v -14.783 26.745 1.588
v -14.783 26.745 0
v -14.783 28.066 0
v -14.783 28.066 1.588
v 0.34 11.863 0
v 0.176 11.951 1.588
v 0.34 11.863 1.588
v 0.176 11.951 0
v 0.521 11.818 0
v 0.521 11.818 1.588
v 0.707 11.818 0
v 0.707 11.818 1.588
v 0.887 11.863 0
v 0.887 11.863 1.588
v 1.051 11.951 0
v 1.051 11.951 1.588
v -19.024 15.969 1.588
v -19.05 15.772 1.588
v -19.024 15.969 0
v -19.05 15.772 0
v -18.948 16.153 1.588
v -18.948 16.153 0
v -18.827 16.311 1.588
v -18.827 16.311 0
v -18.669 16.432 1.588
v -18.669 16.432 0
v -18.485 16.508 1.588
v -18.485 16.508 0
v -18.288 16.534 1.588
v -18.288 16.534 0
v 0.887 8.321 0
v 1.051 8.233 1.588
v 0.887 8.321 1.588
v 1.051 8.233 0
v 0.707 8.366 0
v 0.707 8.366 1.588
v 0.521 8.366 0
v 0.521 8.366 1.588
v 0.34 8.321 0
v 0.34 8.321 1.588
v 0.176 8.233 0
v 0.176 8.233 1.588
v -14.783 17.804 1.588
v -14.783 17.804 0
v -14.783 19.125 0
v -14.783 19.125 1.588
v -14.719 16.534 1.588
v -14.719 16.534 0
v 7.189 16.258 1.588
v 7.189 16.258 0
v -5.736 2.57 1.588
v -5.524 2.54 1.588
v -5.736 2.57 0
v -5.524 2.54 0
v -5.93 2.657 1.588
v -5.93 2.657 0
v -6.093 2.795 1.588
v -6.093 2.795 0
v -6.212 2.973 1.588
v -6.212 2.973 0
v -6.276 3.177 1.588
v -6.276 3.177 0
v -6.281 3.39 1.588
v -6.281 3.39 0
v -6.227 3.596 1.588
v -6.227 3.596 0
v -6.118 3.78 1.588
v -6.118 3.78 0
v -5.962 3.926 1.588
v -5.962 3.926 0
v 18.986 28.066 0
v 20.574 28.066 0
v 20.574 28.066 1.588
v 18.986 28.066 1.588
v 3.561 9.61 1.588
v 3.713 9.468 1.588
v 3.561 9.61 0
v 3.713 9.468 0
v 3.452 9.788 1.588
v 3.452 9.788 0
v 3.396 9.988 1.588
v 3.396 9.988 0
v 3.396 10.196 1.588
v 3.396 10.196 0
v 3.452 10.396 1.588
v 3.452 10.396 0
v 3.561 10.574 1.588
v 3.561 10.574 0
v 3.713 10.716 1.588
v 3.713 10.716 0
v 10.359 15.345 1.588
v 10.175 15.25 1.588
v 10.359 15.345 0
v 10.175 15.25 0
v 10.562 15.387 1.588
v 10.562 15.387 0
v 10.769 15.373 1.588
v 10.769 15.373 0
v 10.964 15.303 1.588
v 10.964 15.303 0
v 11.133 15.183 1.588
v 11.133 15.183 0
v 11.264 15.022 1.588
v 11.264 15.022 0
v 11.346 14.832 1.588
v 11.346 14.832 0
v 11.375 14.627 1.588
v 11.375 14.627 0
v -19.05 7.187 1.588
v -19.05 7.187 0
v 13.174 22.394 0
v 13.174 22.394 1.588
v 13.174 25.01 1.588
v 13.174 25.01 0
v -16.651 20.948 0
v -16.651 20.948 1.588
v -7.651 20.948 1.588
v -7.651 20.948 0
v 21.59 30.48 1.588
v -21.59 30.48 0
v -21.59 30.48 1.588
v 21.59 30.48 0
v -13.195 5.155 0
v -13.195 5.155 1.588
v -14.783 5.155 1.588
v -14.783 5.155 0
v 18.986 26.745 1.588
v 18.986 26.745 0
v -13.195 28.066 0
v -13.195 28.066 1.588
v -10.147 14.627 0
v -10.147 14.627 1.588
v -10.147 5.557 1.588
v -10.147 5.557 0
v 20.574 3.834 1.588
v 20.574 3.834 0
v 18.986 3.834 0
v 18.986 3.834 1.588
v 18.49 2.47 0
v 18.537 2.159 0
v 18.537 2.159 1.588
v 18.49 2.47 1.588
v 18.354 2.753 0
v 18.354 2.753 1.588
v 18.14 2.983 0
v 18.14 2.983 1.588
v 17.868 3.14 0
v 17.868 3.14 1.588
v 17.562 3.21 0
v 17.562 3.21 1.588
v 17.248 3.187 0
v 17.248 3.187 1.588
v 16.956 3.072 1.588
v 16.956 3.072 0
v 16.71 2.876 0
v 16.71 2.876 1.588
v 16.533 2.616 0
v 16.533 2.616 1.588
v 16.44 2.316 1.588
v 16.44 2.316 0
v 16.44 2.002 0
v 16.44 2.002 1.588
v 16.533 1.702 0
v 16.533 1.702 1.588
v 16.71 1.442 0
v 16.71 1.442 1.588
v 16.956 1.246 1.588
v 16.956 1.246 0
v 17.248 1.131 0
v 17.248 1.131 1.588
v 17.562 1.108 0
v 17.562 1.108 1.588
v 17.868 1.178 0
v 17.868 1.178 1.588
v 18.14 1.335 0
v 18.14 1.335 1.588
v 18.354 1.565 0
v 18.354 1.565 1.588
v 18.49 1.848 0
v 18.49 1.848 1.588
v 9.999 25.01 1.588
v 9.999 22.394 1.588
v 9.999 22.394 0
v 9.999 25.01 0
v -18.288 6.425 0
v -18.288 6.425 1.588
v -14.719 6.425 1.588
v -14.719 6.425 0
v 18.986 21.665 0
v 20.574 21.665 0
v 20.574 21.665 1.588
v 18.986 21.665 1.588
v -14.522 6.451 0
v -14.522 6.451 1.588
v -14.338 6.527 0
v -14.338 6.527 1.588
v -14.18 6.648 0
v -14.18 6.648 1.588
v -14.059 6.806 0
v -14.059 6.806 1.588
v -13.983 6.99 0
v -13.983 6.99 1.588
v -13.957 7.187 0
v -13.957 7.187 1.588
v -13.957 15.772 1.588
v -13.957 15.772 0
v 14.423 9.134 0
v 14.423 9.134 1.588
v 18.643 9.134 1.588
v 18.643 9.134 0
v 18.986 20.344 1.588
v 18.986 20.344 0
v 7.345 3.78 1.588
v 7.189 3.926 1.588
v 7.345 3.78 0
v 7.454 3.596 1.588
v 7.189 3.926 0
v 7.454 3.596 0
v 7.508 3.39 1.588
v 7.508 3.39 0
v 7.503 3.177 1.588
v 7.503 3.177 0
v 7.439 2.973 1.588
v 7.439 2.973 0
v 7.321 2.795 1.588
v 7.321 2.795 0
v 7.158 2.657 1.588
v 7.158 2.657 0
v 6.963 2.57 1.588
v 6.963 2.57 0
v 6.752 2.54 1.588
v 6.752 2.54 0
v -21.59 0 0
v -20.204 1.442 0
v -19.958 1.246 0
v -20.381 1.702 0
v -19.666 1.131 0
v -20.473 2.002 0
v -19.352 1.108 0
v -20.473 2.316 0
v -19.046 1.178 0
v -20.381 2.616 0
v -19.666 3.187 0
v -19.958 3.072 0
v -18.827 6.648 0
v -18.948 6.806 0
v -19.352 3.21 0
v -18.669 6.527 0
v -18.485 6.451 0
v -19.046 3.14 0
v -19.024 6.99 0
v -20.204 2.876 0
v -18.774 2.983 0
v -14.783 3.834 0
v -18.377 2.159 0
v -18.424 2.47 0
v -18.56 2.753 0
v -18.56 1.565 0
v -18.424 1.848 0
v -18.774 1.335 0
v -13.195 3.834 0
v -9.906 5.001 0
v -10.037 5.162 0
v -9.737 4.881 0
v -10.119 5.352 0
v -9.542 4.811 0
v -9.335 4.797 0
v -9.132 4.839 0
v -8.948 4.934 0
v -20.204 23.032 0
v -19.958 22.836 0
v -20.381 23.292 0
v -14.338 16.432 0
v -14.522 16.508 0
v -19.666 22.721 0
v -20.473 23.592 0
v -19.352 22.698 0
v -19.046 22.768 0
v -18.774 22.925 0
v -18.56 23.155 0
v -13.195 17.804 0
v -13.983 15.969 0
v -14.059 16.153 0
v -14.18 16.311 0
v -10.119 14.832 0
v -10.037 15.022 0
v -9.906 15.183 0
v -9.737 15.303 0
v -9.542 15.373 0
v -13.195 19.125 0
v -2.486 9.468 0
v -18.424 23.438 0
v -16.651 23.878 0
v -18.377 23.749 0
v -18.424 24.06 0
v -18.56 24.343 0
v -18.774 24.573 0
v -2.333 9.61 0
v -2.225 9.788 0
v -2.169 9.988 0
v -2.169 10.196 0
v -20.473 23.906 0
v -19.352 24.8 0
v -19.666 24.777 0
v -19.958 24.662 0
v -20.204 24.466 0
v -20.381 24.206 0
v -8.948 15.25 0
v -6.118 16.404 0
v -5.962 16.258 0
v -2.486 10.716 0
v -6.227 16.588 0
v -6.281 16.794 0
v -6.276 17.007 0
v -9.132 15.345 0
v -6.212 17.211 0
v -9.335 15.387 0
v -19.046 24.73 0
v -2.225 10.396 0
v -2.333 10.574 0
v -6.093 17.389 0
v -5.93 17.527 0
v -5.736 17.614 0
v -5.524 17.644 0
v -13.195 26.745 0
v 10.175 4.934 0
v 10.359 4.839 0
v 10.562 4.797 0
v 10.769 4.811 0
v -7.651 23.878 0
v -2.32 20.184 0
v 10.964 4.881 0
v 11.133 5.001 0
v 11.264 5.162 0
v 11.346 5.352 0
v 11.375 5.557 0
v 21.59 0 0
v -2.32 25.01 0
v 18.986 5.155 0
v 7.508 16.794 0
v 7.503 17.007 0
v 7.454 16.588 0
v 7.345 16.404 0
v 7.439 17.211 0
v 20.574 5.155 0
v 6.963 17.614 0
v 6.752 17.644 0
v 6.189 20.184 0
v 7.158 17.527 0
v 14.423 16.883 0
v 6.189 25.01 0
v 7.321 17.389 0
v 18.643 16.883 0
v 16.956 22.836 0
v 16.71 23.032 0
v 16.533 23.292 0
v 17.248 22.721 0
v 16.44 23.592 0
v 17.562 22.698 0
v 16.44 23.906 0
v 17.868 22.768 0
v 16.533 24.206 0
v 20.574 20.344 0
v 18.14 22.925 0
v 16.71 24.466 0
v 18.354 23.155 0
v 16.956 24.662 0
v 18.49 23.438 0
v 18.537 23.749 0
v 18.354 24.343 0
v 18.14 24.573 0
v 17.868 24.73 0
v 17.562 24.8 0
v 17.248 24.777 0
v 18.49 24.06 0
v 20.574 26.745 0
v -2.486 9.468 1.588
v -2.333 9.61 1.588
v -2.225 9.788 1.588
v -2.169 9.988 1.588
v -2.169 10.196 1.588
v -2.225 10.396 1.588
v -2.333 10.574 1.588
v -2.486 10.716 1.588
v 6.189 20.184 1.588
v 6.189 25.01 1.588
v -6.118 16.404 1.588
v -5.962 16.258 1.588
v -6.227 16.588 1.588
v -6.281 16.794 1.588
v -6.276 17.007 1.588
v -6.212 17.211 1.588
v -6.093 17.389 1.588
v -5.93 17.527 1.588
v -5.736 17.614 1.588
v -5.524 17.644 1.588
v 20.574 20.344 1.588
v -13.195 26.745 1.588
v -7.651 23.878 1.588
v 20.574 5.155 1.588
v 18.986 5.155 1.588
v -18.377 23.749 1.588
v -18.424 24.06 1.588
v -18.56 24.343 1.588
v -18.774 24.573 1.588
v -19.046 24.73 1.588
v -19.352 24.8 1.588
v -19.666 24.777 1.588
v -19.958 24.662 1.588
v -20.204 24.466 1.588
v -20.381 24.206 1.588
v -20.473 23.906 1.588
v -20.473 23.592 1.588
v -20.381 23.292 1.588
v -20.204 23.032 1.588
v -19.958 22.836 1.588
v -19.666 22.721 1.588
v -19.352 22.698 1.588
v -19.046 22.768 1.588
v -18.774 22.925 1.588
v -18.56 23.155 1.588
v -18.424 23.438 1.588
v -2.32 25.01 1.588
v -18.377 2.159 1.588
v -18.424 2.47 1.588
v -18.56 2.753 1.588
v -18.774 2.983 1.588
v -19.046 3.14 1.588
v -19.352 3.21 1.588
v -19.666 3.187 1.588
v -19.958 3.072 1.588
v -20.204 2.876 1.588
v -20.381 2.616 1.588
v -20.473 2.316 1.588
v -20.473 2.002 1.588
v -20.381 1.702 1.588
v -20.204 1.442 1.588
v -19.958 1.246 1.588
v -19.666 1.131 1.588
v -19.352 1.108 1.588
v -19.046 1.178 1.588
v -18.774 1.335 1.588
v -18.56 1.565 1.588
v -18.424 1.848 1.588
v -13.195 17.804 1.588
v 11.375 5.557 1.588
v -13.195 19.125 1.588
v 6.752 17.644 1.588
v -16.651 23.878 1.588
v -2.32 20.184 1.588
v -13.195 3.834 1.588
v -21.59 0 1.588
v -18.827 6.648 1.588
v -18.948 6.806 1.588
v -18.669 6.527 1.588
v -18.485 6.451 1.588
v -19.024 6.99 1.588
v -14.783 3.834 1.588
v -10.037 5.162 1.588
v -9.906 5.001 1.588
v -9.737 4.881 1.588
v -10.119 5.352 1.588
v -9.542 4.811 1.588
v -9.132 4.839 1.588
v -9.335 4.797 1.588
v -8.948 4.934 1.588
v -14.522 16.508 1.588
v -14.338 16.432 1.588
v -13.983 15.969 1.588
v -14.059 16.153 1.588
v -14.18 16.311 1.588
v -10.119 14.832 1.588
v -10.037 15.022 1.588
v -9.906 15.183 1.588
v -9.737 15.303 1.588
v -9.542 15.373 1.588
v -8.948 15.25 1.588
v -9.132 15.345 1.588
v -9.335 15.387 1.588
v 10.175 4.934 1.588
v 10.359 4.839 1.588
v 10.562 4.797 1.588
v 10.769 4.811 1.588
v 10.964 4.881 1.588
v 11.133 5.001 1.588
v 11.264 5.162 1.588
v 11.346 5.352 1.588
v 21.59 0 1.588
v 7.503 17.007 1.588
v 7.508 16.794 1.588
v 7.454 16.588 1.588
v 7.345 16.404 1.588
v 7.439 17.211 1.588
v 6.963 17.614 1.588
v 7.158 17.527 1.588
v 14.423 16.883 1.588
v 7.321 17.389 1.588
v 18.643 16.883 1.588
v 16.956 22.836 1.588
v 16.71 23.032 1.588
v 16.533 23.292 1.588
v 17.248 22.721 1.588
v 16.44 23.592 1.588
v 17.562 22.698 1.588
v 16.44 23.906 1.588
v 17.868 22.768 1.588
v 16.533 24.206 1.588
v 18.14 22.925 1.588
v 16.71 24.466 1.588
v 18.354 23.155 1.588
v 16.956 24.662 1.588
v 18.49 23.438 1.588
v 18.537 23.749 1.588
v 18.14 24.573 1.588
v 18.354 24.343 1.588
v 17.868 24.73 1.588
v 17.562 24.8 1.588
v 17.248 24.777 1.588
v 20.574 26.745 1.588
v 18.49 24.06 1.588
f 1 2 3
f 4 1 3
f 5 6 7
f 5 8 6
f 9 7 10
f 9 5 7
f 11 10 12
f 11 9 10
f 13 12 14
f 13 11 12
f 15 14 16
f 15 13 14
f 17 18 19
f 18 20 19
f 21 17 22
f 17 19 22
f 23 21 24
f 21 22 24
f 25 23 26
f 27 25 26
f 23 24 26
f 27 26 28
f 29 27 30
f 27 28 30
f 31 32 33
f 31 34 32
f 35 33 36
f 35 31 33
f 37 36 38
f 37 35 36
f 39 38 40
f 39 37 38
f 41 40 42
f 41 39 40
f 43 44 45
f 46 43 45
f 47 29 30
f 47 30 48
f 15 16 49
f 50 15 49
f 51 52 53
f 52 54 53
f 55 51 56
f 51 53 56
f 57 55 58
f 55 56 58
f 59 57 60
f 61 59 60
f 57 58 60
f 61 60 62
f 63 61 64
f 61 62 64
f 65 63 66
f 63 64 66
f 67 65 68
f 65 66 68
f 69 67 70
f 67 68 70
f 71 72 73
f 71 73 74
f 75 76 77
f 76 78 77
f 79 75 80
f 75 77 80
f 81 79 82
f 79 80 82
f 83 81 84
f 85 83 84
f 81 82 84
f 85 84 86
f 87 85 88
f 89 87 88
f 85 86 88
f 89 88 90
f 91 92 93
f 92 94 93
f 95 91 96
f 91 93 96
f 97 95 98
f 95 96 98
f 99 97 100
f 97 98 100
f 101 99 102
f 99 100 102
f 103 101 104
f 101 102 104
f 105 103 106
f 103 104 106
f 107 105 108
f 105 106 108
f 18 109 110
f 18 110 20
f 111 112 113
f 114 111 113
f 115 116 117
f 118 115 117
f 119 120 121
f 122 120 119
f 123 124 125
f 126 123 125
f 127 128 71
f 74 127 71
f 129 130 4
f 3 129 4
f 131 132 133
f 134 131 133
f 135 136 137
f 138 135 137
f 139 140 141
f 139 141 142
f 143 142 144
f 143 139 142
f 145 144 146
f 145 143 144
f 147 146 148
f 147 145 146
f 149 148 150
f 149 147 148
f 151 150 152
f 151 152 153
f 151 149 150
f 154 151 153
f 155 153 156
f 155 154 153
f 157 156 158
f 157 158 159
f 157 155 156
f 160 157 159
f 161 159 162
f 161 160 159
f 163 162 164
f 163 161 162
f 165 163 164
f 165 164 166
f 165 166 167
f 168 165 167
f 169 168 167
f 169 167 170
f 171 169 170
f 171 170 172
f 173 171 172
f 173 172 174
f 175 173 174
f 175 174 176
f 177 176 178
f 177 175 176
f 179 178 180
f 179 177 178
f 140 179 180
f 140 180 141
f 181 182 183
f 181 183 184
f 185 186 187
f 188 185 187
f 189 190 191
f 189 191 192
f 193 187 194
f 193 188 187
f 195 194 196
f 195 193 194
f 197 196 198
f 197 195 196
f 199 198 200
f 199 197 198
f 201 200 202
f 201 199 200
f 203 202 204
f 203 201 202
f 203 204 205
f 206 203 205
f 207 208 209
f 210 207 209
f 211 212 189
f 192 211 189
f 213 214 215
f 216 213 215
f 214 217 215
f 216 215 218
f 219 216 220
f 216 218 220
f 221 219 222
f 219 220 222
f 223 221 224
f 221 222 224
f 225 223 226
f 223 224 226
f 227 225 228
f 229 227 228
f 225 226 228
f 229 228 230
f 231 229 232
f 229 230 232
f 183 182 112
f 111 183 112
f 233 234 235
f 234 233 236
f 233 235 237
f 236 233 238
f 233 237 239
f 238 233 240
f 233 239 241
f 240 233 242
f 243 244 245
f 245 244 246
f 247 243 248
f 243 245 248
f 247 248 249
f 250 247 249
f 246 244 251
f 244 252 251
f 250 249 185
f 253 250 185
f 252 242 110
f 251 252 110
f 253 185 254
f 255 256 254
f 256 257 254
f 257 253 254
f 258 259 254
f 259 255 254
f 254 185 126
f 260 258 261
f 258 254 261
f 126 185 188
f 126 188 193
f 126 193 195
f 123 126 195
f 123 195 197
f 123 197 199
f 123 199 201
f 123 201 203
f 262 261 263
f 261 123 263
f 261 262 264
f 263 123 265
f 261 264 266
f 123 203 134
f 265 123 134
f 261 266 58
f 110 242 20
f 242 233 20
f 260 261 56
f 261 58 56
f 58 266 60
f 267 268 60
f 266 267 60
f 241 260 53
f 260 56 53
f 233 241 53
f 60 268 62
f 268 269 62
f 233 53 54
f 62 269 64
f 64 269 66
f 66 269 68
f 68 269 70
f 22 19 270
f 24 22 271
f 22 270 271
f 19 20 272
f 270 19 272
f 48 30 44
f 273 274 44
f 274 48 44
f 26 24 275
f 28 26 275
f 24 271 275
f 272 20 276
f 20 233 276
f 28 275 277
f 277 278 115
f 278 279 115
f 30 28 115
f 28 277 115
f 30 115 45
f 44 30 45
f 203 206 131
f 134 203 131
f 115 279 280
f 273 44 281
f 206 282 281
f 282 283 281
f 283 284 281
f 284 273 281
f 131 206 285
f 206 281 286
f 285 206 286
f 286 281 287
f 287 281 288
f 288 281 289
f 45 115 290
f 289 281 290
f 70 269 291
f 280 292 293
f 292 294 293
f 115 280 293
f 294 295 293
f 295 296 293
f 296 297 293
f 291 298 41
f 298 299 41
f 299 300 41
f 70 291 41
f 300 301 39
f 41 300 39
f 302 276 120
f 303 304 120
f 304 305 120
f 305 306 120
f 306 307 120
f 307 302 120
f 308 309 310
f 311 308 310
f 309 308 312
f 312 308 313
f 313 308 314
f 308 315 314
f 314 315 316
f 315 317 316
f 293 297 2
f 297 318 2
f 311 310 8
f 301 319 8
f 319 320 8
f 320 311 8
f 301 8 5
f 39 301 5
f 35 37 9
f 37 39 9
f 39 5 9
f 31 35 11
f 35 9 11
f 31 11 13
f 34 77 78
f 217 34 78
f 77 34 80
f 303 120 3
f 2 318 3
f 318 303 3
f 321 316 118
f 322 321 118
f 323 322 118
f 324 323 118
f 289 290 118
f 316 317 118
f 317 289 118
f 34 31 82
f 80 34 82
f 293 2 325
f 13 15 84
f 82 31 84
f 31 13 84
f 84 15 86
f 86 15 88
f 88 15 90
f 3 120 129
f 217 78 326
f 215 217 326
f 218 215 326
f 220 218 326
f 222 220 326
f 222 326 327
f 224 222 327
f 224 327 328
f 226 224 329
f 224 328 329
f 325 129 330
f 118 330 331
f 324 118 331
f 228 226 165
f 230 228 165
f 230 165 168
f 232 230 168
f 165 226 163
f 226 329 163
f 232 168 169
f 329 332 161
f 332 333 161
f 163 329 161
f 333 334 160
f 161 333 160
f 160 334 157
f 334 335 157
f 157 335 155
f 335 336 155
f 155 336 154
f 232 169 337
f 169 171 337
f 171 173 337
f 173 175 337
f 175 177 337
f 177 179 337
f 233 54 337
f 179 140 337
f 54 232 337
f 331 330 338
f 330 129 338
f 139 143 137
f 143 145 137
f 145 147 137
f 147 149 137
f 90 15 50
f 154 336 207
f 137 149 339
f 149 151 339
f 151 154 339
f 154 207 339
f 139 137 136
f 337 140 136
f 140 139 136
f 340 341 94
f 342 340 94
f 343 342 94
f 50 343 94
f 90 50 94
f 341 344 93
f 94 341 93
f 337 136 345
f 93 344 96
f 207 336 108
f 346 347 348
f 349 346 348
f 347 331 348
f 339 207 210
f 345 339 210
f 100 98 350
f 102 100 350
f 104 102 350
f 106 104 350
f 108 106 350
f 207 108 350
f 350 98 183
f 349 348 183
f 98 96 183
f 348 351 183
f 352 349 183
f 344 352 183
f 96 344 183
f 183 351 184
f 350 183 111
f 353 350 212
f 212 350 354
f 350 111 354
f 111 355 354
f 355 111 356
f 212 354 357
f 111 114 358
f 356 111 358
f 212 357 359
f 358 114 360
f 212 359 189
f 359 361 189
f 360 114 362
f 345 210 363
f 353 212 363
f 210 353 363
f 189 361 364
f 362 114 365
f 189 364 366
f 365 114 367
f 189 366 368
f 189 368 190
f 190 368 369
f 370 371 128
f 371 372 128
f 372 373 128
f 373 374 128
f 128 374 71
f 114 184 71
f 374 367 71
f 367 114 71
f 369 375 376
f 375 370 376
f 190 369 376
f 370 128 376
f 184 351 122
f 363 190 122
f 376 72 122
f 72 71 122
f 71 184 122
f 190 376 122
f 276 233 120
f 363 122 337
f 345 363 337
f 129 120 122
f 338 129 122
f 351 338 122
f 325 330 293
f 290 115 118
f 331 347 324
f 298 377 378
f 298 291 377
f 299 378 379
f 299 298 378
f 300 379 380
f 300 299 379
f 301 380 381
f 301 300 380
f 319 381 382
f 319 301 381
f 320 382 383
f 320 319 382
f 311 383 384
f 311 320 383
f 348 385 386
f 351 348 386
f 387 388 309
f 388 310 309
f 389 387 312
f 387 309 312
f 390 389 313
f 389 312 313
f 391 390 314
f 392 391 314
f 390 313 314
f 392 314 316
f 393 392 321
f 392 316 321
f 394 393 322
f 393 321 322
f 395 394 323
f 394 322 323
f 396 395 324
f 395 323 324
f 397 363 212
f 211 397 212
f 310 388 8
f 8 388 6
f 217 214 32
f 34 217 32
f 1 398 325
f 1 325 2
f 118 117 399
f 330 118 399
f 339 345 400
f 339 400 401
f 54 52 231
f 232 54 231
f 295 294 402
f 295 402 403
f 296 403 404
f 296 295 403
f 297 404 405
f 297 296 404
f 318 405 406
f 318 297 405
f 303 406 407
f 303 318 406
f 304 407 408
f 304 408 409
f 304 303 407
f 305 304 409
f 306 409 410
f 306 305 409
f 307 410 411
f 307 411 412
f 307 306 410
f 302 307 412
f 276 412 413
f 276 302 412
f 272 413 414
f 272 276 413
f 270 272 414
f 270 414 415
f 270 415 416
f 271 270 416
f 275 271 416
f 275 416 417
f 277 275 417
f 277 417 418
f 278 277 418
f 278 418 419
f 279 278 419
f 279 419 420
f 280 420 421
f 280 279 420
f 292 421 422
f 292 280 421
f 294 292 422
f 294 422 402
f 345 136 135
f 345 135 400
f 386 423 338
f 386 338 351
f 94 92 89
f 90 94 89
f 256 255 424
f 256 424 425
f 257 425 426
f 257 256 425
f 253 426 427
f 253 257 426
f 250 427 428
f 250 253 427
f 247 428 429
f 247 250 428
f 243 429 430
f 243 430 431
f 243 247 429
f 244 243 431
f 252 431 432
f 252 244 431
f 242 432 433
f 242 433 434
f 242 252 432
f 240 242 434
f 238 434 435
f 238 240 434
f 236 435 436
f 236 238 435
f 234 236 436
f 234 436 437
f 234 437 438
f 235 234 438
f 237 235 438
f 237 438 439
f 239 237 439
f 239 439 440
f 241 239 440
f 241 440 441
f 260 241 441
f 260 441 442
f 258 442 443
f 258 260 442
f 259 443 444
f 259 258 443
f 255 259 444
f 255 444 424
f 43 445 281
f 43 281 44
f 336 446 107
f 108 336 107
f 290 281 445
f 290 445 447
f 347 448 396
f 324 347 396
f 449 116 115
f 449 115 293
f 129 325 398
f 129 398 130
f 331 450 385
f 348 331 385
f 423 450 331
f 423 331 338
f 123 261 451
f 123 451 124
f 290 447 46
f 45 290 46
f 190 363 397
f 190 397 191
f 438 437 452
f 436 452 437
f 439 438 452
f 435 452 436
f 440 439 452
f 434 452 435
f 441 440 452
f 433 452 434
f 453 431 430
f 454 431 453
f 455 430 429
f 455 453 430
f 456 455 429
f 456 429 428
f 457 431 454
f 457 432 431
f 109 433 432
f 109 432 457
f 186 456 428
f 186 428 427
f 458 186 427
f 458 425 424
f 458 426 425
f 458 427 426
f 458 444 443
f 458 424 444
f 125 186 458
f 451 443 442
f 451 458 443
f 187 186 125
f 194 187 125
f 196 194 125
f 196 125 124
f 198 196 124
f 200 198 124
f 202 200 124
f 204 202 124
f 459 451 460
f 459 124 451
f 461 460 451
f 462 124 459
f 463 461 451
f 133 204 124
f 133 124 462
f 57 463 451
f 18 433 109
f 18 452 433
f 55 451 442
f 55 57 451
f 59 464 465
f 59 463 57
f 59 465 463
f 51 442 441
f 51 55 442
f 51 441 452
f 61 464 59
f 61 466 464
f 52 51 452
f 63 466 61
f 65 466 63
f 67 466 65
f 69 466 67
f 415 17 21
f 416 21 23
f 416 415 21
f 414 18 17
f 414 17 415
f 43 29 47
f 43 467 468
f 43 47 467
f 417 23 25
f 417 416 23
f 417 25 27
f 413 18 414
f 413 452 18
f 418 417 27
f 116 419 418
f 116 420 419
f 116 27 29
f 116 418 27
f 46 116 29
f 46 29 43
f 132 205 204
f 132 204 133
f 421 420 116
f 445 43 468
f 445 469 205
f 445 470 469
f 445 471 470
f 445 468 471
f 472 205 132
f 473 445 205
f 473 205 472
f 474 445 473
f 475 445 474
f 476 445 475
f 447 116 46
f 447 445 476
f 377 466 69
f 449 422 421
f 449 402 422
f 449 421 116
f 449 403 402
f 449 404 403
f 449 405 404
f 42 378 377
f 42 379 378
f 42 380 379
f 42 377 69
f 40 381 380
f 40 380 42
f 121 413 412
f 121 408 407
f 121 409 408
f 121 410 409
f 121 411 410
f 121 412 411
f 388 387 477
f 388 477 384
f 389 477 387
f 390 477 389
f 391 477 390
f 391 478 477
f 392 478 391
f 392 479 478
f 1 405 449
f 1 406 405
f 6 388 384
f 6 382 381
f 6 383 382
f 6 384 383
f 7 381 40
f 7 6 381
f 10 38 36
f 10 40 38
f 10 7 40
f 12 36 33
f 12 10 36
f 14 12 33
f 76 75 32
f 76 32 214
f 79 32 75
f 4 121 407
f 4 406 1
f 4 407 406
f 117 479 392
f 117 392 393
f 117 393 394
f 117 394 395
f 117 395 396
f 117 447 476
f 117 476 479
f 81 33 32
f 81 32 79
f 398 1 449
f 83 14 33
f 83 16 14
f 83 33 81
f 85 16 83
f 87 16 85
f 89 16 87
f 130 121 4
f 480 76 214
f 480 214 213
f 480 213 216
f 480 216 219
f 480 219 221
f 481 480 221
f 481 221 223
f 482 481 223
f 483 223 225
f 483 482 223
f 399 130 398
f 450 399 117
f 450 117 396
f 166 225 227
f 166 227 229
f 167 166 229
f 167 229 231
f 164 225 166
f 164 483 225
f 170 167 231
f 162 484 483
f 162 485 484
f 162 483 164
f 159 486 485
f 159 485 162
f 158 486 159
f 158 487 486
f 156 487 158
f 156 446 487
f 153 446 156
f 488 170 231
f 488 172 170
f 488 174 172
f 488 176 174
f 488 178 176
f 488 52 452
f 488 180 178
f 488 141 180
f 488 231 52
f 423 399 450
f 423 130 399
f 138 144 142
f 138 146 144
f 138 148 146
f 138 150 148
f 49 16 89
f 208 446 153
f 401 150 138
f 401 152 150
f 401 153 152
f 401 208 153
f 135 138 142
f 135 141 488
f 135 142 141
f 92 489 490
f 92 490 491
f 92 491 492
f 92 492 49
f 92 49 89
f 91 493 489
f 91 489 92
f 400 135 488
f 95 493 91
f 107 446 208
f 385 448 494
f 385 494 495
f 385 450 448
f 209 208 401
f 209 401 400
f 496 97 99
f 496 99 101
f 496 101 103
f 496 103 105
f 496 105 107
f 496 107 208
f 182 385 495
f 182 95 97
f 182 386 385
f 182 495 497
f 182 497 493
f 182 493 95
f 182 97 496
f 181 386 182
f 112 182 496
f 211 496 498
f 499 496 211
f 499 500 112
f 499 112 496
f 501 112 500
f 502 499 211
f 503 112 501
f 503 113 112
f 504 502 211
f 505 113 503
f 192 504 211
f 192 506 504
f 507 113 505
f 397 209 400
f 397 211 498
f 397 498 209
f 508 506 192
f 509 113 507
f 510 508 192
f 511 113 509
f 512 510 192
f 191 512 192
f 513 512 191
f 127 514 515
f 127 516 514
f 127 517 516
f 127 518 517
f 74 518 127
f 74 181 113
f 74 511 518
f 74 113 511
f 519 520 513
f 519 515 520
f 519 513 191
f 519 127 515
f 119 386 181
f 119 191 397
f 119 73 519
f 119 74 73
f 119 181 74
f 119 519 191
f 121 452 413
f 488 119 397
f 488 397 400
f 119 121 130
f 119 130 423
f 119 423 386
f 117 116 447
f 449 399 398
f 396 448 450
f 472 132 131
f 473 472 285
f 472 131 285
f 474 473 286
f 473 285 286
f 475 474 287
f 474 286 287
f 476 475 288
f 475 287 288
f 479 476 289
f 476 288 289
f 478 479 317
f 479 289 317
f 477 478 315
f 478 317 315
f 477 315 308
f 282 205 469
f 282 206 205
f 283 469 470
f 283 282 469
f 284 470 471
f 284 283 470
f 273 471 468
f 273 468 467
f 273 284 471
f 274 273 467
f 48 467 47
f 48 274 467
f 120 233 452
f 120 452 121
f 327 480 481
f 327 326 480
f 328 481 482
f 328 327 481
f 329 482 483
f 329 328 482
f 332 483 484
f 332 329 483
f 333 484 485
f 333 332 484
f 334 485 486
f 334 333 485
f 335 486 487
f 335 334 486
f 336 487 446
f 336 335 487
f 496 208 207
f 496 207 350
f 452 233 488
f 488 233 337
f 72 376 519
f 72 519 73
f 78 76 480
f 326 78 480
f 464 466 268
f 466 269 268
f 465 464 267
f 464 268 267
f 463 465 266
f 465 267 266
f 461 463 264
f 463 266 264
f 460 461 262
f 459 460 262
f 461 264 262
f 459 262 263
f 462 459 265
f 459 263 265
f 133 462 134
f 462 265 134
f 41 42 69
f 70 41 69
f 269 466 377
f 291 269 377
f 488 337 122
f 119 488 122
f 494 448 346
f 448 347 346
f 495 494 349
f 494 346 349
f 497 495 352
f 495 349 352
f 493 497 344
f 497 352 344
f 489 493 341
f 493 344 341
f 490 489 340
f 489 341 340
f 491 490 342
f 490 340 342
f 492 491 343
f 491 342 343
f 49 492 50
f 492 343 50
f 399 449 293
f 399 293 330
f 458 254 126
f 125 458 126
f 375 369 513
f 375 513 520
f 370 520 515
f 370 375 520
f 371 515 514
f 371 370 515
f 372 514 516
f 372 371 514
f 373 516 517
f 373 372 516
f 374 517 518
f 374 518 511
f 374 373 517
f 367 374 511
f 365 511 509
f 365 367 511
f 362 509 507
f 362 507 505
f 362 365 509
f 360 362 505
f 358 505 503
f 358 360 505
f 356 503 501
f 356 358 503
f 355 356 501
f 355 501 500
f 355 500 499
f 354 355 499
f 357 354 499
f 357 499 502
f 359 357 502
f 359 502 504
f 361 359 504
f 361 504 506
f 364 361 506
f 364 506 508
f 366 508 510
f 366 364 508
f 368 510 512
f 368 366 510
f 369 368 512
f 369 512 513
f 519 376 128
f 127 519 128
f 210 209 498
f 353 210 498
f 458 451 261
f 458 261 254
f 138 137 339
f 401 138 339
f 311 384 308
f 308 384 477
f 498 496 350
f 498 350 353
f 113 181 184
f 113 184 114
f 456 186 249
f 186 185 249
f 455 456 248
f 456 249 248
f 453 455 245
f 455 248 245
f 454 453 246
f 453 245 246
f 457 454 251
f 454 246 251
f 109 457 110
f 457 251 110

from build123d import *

# Parameters (mm, degrees)
SKETCH1_W                   = 43.18
SKETCH1_H                   = 30.48
SKETCH1_R                   = 1.0541
BOSS_EXTRUDE1_DEPTH         = 1.5875
CAMERA_CUTS_REACH           = 39.386
SKETCH5_W                   = 9
SKETCH5_H                   = 2.93
SKETCH5_W_2                 = 8.509
SKETCH5_H_2                 = 4.826
SKETCH5_W_3                 = 3.175
SKETCH5_H_3                 = 2.6162
SKETCH5_W_4                 = 4.22
SKETCH5_H_4                 = 7.75
SKETCH6_W                   = 5.0927
SKETCH6_H                   = 10.1092
WEIGHT_REDUCTION_CUTS_DEPTH = 2.54
ATTACHMENT_CUTS_REACH       = 39.386
SKETCH7_W                   = 1.5875
SKETCH7_H                   = 1.3208
FILLET8_R                   = 0.762


with BuildPart() as part:
    # Sketch1 → Boss-Extrude1 (new body)
    with BuildSketch(Plane.XY):
        with Locations((0, 15.24)):
            Rectangle(SKETCH1_W, SKETCH1_H)
        with Locations((17.48282, 2.159)):
            Circle(SKETCH1_R, mode=Mode.SUBTRACT)
        with Locations((17.48282, 23.749)):
            Circle(SKETCH1_R, mode=Mode.SUBTRACT)
        with Locations((-19.431, 2.159)):
            Circle(SKETCH1_R, mode=Mode.SUBTRACT)
        with Locations((-19.431, 23.749)):
            Circle(SKETCH1_R, mode=Mode.SUBTRACT)
    extrude(amount=BOSS_EXTRUDE1_DEPTH)

    # Sketch5 → Camera Cuts (cut, up to next)
    with BuildSketch(Plane.XY.offset(1.5875), mode=Mode.PRIVATE) as camera_cuts_sk1:
        with Locations((-12.151, 22.413)):
            Rectangle(SKETCH5_W, SKETCH5_H)
    camera_cuts_tool1 = extrude(camera_cuts_sk1.sketch, amount=-CAMERA_CUTS_REACH, mode=Mode.PRIVATE) & part.part
    # Sketch5 → Camera Cuts (cut, up to next)
    with BuildSketch(Plane.XY.offset(1.5875), mode=Mode.PRIVATE) as camera_cuts_sk2:
        with Locations((1.9341, 22.597)):
            Rectangle(SKETCH5_W_2, SKETCH5_H_2)
    camera_cuts_tool2 = extrude(camera_cuts_sk2.sketch, amount=-CAMERA_CUTS_REACH, mode=Mode.PRIVATE) & part.part
    # Sketch5 → Camera Cuts (cut, up to next)
    with BuildSketch(Plane.XY.offset(1.5875), mode=Mode.PRIVATE) as camera_cuts_sk3:
        with Locations((11.5861, 23.7019)):
            Rectangle(SKETCH5_W_3, SKETCH5_H_3)
    camera_cuts_tool3 = extrude(camera_cuts_sk3.sketch, amount=-CAMERA_CUTS_REACH, mode=Mode.PRIVATE) & part.part
    # Sketch5 → Camera Cuts (cut, up to next)
    with BuildSketch(Plane.XY.offset(1.5875), mode=Mode.PRIVATE) as camera_cuts_sk4:
        with Locations((16.5326, 13.0085)):
            Rectangle(SKETCH5_W_4, SKETCH5_H_4)
    camera_cuts_tool4 = extrude(camera_cuts_sk4.sketch, amount=-CAMERA_CUTS_REACH, mode=Mode.PRIVATE) & part.part
    add(camera_cuts_tool1.solids().sort_by_distance((-12.151, 22.413, 1.5875))[0], mode=Mode.SUBTRACT)
    add(camera_cuts_tool2.solids().sort_by_distance((1.9341, 22.597, 1.5875))[0], mode=Mode.SUBTRACT)
    add(camera_cuts_tool3.solids().sort_by_distance((11.5861, 23.7019, 1.5875))[0], mode=Mode.SUBTRACT)
    add(camera_cuts_tool4.solids().sort_by_distance((16.5326, 13.0085, 1.5875))[0], mode=Mode.SUBTRACT)

    # Sketch6 → Weight Reduction Cuts (cut)
    with BuildSketch(Plane.XY.offset(1.5875)):
        Polygon((9.163785799, 2.54), (0.61365, 8.540457725), (-7.936485799, 2.54), align=None)
        Polygon((2.824464201, 10.092), (11.3746, 4.091542275), (11.3746, 16.092457725), align=None)
        Polygon((-7.936485799, 17.644), (0.61365, 11.643542275), (9.163785799, 17.644), align=None)
        Polygon((-10.1473, 4.091542275), (-1.597164201, 10.092), (-10.1473, 16.092457725), align=None)
        with Locations((-16.50365, 11.479427373)):
            Rectangle(SKETCH6_W, SKETCH6_H)
    extrude(amount=-WEIGHT_REDUCTION_CUTS_DEPTH, mode=Mode.SUBTRACT)

    # Sketch7 → Attachment Cuts (cut, up to next)
    with BuildSketch(Plane(origin=(0, 0, 0), x_dir=(-1, 0, 0), z_dir=(0, 0, -1)), mode=Mode.PRIVATE) as attachment_cuts_sk1:
        with Locations((13.98905, 27.405227373)):
            Rectangle(SKETCH7_W, SKETCH7_H)
    attachment_cuts_tool1 = extrude(attachment_cuts_sk1.sketch, amount=-ATTACHMENT_CUTS_REACH, mode=Mode.PRIVATE) & part.part
    # Sketch7 → Attachment Cuts (cut, up to next)
    with BuildSketch(Plane(origin=(0, 0, 0), x_dir=(-1, 0, 0), z_dir=(0, 0, -1)), mode=Mode.PRIVATE) as attachment_cuts_sk2:
        with Locations((13.98905, 18.464427373)):
            Rectangle(SKETCH7_W, SKETCH7_H)
    attachment_cuts_tool2 = extrude(attachment_cuts_sk2.sketch, amount=-ATTACHMENT_CUTS_REACH, mode=Mode.PRIVATE) & part.part
    # Sketch7 → Attachment Cuts (cut, up to next)
    with BuildSketch(Plane(origin=(0, 0, 0), x_dir=(-1, 0, 0), z_dir=(0, 0, -1)), mode=Mode.PRIVATE) as attachment_cuts_sk3:
        with Locations((13.98905, 4.494427373)):
            Rectangle(SKETCH7_W, SKETCH7_H)
    attachment_cuts_tool3 = extrude(attachment_cuts_sk3.sketch, amount=-ATTACHMENT_CUTS_REACH, mode=Mode.PRIVATE) & part.part
    # Sketch7 → Attachment Cuts (cut, up to next)
    with BuildSketch(Plane(origin=(0, 0, 0), x_dir=(-1, 0, 0), z_dir=(0, 0, -1)), mode=Mode.PRIVATE) as attachment_cuts_sk4:
        with Locations((-19.78025, 4.494427373)):
            Rectangle(SKETCH7_W, SKETCH7_H)
    attachment_cuts_tool4 = extrude(attachment_cuts_sk4.sketch, amount=-ATTACHMENT_CUTS_REACH, mode=Mode.PRIVATE) & part.part
    # Sketch7 → Attachment Cuts (cut, up to next)
    with BuildSketch(Plane(origin=(0, 0, 0), x_dir=(-1, 0, 0), z_dir=(0, 0, -1)), mode=Mode.PRIVATE) as attachment_cuts_sk5:
        with Locations((-19.78025, 21.004427373)):
            Rectangle(SKETCH7_W, SKETCH7_H)
    attachment_cuts_tool5 = extrude(attachment_cuts_sk5.sketch, amount=-ATTACHMENT_CUTS_REACH, mode=Mode.PRIVATE) & part.part
    # Sketch7 → Attachment Cuts (cut, up to next)
    with BuildSketch(Plane(origin=(0, 0, 0), x_dir=(-1, 0, 0), z_dir=(0, 0, -1)), mode=Mode.PRIVATE) as attachment_cuts_sk6:
        with Locations((-19.78025, 27.405227373)):
            Rectangle(SKETCH7_W, SKETCH7_H)
    attachment_cuts_tool6 = extrude(attachment_cuts_sk6.sketch, amount=-ATTACHMENT_CUTS_REACH, mode=Mode.PRIVATE) & part.part
    add(attachment_cuts_tool1.solids().sort_by_distance((-13.98905, 27.405227, 0))[0], mode=Mode.SUBTRACT)
    add(attachment_cuts_tool2.solids().sort_by_distance((-13.98905, 18.464427, 0))[0], mode=Mode.SUBTRACT)
    add(attachment_cuts_tool3.solids().sort_by_distance((-13.98905, 4.494427, 0))[0], mode=Mode.SUBTRACT)
    add(attachment_cuts_tool4.solids().sort_by_distance((19.78025, 4.494427, 0))[0], mode=Mode.SUBTRACT)
    add(attachment_cuts_tool5.solids().sort_by_distance((19.78025, 21.004427, 0))[0], mode=Mode.SUBTRACT)
    add(attachment_cuts_tool6.solids().sort_by_distance((19.78025, 27.405227, 0))[0], mode=Mode.SUBTRACT)

    # Fillet8
    fillet8_edges = [part.edges().sort_by_distance(p)[0] for p in [
        (9.163785799, 17.644, 0.79375),
        (0.61365, 11.643542275, 0.79375),
        (-7.936485799, 17.644, 0.79375),
        (-1.597164201, 10.092, 0.79375),
        (-10.1473, 4.091542275, 0.79375),
        (-10.1473, 16.092457725, 0.79375),
        (-13.9573, 6.424827373, 0.79375),
        (-19.05, 6.424827373, 0.79375),
        (-19.05, 16.534027373, 0.79375),
        (-13.9573, 16.534027373, 0.79375),
        (0.61365, 8.540457725, 0.79375),
        (9.163785799, 2.54, 0.79375),
        (-7.936485799, 2.54, 0.79375),
        (11.3746, 16.092457725, 0.79375),
        (11.3746, 4.091542275, 0.79375),
        (2.824464201, 10.092, 0.79375),
    ]]
    fillet(fillet8_edges, radius=FILLET8_R)


solid = part.part
